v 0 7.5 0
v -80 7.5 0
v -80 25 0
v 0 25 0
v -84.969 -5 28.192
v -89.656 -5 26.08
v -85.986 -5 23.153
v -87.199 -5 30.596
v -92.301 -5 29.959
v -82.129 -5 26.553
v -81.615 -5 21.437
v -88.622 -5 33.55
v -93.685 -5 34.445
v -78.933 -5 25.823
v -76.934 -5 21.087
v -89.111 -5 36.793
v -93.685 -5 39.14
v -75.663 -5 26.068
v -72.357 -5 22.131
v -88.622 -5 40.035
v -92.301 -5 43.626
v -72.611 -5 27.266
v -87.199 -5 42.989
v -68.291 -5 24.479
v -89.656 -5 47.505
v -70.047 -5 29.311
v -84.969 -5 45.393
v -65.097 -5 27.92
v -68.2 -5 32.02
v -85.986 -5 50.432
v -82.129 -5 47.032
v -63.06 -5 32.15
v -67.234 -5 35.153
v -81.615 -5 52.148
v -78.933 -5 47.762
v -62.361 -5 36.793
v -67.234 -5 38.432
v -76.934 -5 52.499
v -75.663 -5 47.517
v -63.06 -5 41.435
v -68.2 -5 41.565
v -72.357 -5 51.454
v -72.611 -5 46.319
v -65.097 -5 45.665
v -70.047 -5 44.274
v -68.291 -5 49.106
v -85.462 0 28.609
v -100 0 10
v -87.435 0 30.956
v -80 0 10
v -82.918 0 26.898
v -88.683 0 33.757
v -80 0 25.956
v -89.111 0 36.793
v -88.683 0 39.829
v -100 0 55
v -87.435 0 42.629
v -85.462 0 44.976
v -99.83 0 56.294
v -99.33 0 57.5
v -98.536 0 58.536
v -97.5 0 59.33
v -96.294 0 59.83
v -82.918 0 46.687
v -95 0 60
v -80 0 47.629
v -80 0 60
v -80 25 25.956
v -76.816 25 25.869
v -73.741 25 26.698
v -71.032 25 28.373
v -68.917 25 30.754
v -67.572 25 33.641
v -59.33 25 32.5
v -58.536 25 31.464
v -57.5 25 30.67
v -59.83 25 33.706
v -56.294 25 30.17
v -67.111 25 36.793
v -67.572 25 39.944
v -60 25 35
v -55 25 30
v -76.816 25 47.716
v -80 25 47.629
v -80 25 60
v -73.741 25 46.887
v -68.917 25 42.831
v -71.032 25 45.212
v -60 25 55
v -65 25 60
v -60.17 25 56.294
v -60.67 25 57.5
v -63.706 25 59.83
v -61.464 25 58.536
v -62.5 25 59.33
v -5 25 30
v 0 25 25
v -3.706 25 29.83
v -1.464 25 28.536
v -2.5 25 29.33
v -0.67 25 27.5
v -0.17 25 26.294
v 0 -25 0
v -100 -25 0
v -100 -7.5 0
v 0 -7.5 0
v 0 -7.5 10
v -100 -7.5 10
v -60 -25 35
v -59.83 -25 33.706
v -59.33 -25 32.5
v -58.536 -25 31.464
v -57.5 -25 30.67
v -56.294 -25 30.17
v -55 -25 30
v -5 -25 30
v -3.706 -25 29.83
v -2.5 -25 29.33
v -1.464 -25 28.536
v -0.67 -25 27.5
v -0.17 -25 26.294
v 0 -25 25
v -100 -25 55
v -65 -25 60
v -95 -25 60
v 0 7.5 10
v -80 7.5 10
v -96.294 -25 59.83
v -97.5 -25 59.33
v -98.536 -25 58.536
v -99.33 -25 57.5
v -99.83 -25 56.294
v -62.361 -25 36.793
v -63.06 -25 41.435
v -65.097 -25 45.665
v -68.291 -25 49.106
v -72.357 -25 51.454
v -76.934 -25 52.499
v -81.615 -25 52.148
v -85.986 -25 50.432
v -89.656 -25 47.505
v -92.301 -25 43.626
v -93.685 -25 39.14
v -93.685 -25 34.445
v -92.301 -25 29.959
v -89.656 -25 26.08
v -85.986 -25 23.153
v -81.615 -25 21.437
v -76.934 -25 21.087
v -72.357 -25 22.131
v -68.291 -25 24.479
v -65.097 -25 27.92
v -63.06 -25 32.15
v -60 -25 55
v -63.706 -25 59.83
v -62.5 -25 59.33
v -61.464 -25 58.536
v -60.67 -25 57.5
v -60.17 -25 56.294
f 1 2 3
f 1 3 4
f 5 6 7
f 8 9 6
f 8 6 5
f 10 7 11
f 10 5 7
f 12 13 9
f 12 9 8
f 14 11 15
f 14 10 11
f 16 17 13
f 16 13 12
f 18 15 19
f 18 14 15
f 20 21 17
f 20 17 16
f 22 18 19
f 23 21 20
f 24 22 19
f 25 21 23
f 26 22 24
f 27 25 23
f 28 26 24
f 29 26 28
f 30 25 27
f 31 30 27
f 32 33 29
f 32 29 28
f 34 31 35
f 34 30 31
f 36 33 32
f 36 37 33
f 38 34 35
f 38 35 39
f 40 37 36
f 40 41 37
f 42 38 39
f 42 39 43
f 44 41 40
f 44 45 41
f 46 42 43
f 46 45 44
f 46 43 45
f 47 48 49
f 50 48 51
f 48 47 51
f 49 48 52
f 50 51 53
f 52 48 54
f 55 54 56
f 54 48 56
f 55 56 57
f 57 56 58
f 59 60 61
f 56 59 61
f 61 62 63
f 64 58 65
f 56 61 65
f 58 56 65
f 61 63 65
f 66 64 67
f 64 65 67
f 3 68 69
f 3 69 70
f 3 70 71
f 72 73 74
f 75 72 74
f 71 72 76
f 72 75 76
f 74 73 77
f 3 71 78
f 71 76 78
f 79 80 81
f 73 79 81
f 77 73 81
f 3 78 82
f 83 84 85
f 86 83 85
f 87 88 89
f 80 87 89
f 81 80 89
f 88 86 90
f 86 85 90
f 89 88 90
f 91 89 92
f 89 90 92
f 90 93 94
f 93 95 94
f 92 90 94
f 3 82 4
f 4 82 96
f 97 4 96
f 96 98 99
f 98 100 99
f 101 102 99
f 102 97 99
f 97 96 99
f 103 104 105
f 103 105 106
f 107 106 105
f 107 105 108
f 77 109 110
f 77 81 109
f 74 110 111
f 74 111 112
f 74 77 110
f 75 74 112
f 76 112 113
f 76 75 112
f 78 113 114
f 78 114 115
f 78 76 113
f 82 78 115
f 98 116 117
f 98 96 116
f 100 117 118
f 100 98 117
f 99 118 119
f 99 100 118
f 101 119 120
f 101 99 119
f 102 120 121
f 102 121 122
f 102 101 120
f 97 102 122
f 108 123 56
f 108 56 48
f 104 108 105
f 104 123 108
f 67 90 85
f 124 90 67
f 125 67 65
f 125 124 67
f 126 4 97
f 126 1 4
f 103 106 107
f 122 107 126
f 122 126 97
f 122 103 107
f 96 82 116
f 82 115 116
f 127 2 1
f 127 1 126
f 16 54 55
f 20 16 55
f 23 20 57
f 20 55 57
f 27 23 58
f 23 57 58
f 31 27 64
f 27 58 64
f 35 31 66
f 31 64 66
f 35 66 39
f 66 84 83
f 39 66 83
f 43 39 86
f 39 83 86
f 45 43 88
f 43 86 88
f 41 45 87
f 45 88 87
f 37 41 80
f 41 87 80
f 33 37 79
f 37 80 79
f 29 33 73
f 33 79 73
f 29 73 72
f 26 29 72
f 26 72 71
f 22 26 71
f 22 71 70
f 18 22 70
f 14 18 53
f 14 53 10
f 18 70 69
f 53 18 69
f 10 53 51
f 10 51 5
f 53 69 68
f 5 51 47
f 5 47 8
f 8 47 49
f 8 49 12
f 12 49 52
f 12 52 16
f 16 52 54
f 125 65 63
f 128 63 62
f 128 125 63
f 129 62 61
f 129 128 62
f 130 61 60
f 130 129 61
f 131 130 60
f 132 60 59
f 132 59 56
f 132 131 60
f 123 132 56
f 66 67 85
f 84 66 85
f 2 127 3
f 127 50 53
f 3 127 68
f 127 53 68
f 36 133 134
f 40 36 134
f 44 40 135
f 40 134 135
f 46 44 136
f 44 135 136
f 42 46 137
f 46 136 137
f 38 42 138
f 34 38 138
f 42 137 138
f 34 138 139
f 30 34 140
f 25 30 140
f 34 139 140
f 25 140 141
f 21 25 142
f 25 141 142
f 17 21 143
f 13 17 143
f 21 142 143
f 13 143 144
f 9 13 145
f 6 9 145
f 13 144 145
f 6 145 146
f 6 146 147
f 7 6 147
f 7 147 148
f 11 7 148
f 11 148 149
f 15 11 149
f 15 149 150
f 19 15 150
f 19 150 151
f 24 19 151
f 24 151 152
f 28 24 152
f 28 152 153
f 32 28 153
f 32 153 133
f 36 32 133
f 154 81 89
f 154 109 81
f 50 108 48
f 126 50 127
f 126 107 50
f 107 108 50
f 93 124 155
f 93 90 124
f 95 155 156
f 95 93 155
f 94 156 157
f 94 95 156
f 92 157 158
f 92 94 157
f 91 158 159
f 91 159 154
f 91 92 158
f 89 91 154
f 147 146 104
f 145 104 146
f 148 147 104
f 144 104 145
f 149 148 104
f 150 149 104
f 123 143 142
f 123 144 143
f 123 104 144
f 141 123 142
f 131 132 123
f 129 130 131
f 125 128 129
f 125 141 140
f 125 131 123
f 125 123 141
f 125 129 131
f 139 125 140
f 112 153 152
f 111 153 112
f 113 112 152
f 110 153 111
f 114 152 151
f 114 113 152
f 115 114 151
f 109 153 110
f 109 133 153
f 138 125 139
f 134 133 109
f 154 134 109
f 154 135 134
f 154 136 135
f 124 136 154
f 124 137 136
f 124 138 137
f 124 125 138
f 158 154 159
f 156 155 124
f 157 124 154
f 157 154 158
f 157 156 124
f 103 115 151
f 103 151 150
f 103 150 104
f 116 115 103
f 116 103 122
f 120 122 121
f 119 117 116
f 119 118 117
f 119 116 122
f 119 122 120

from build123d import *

# Parameters (mm, degrees)
F0_W           = 60
F0_H           = 30
F1_DEPTH       = 25
F2_R           = 5
F4_D           = 22
F4_CBORE_D     = 31.5
F4_CBORE_DEPTH = 20
F5_W           = 15
F5_H           = 10
F6_DEPTH       = 100.001
F7_W           = 15
F7_H           = 25
F8_DEPTH       = 60.001


with BuildPart() as f1:
    # F0 (on Front) → F1 (new body, symmetric)
    with BuildSketch(Plane.XZ):
        Polygon((-60, 60), (-100, 60), (-100, 0), (-60, 0), (-60, 30), align=None)
        with Locations((-30, 15)):
            Rectangle(F0_W, F0_H)
    extrude(amount=F1_DEPTH, both=True)

    # F2
    f2_edges = [f1.edges().sort_by_distance(p)[0] for p in [
        (-60, 0, 30),
        (-60, 0, 60),
        (0, 0, 30),
        (-100, 0, 60),
    ]]
    fillet(f2_edges, radius=F2_R)

    # F4 (through all)
    with Locations(Plane.XZ.offset(25)):
        with Locations((-78.1107470393, 36.7925874889)):
            CounterBoreHole(F4_D / 2, F4_CBORE_D / 2, F4_CBORE_DEPTH)

    # F5 (on face) → F6 (cut, through all)
    with BuildSketch(Plane.YZ):
        with Locations((0, 5)):
            Rectangle(F5_W, F5_H)
    extrude(amount=-F6_DEPTH, mode=Mode.SUBTRACT)

    # F7 (on face) → F8 (cut, through all)
    with BuildSketch(Plane.XY.offset(60)):
        Polygon((-80, 47.3070815206), (-123.8557249308, 47.3070815206), (-123.8557249308, 0), (-95, 0), (-95, 25), (-80, 25), align=None)
        with Locations((-87.5, 12.5)):
            Rectangle(F7_W, F7_H)
    extrude(amount=-F8_DEPTH, mode=Mode.SUBTRACT)


solid = f1.part
